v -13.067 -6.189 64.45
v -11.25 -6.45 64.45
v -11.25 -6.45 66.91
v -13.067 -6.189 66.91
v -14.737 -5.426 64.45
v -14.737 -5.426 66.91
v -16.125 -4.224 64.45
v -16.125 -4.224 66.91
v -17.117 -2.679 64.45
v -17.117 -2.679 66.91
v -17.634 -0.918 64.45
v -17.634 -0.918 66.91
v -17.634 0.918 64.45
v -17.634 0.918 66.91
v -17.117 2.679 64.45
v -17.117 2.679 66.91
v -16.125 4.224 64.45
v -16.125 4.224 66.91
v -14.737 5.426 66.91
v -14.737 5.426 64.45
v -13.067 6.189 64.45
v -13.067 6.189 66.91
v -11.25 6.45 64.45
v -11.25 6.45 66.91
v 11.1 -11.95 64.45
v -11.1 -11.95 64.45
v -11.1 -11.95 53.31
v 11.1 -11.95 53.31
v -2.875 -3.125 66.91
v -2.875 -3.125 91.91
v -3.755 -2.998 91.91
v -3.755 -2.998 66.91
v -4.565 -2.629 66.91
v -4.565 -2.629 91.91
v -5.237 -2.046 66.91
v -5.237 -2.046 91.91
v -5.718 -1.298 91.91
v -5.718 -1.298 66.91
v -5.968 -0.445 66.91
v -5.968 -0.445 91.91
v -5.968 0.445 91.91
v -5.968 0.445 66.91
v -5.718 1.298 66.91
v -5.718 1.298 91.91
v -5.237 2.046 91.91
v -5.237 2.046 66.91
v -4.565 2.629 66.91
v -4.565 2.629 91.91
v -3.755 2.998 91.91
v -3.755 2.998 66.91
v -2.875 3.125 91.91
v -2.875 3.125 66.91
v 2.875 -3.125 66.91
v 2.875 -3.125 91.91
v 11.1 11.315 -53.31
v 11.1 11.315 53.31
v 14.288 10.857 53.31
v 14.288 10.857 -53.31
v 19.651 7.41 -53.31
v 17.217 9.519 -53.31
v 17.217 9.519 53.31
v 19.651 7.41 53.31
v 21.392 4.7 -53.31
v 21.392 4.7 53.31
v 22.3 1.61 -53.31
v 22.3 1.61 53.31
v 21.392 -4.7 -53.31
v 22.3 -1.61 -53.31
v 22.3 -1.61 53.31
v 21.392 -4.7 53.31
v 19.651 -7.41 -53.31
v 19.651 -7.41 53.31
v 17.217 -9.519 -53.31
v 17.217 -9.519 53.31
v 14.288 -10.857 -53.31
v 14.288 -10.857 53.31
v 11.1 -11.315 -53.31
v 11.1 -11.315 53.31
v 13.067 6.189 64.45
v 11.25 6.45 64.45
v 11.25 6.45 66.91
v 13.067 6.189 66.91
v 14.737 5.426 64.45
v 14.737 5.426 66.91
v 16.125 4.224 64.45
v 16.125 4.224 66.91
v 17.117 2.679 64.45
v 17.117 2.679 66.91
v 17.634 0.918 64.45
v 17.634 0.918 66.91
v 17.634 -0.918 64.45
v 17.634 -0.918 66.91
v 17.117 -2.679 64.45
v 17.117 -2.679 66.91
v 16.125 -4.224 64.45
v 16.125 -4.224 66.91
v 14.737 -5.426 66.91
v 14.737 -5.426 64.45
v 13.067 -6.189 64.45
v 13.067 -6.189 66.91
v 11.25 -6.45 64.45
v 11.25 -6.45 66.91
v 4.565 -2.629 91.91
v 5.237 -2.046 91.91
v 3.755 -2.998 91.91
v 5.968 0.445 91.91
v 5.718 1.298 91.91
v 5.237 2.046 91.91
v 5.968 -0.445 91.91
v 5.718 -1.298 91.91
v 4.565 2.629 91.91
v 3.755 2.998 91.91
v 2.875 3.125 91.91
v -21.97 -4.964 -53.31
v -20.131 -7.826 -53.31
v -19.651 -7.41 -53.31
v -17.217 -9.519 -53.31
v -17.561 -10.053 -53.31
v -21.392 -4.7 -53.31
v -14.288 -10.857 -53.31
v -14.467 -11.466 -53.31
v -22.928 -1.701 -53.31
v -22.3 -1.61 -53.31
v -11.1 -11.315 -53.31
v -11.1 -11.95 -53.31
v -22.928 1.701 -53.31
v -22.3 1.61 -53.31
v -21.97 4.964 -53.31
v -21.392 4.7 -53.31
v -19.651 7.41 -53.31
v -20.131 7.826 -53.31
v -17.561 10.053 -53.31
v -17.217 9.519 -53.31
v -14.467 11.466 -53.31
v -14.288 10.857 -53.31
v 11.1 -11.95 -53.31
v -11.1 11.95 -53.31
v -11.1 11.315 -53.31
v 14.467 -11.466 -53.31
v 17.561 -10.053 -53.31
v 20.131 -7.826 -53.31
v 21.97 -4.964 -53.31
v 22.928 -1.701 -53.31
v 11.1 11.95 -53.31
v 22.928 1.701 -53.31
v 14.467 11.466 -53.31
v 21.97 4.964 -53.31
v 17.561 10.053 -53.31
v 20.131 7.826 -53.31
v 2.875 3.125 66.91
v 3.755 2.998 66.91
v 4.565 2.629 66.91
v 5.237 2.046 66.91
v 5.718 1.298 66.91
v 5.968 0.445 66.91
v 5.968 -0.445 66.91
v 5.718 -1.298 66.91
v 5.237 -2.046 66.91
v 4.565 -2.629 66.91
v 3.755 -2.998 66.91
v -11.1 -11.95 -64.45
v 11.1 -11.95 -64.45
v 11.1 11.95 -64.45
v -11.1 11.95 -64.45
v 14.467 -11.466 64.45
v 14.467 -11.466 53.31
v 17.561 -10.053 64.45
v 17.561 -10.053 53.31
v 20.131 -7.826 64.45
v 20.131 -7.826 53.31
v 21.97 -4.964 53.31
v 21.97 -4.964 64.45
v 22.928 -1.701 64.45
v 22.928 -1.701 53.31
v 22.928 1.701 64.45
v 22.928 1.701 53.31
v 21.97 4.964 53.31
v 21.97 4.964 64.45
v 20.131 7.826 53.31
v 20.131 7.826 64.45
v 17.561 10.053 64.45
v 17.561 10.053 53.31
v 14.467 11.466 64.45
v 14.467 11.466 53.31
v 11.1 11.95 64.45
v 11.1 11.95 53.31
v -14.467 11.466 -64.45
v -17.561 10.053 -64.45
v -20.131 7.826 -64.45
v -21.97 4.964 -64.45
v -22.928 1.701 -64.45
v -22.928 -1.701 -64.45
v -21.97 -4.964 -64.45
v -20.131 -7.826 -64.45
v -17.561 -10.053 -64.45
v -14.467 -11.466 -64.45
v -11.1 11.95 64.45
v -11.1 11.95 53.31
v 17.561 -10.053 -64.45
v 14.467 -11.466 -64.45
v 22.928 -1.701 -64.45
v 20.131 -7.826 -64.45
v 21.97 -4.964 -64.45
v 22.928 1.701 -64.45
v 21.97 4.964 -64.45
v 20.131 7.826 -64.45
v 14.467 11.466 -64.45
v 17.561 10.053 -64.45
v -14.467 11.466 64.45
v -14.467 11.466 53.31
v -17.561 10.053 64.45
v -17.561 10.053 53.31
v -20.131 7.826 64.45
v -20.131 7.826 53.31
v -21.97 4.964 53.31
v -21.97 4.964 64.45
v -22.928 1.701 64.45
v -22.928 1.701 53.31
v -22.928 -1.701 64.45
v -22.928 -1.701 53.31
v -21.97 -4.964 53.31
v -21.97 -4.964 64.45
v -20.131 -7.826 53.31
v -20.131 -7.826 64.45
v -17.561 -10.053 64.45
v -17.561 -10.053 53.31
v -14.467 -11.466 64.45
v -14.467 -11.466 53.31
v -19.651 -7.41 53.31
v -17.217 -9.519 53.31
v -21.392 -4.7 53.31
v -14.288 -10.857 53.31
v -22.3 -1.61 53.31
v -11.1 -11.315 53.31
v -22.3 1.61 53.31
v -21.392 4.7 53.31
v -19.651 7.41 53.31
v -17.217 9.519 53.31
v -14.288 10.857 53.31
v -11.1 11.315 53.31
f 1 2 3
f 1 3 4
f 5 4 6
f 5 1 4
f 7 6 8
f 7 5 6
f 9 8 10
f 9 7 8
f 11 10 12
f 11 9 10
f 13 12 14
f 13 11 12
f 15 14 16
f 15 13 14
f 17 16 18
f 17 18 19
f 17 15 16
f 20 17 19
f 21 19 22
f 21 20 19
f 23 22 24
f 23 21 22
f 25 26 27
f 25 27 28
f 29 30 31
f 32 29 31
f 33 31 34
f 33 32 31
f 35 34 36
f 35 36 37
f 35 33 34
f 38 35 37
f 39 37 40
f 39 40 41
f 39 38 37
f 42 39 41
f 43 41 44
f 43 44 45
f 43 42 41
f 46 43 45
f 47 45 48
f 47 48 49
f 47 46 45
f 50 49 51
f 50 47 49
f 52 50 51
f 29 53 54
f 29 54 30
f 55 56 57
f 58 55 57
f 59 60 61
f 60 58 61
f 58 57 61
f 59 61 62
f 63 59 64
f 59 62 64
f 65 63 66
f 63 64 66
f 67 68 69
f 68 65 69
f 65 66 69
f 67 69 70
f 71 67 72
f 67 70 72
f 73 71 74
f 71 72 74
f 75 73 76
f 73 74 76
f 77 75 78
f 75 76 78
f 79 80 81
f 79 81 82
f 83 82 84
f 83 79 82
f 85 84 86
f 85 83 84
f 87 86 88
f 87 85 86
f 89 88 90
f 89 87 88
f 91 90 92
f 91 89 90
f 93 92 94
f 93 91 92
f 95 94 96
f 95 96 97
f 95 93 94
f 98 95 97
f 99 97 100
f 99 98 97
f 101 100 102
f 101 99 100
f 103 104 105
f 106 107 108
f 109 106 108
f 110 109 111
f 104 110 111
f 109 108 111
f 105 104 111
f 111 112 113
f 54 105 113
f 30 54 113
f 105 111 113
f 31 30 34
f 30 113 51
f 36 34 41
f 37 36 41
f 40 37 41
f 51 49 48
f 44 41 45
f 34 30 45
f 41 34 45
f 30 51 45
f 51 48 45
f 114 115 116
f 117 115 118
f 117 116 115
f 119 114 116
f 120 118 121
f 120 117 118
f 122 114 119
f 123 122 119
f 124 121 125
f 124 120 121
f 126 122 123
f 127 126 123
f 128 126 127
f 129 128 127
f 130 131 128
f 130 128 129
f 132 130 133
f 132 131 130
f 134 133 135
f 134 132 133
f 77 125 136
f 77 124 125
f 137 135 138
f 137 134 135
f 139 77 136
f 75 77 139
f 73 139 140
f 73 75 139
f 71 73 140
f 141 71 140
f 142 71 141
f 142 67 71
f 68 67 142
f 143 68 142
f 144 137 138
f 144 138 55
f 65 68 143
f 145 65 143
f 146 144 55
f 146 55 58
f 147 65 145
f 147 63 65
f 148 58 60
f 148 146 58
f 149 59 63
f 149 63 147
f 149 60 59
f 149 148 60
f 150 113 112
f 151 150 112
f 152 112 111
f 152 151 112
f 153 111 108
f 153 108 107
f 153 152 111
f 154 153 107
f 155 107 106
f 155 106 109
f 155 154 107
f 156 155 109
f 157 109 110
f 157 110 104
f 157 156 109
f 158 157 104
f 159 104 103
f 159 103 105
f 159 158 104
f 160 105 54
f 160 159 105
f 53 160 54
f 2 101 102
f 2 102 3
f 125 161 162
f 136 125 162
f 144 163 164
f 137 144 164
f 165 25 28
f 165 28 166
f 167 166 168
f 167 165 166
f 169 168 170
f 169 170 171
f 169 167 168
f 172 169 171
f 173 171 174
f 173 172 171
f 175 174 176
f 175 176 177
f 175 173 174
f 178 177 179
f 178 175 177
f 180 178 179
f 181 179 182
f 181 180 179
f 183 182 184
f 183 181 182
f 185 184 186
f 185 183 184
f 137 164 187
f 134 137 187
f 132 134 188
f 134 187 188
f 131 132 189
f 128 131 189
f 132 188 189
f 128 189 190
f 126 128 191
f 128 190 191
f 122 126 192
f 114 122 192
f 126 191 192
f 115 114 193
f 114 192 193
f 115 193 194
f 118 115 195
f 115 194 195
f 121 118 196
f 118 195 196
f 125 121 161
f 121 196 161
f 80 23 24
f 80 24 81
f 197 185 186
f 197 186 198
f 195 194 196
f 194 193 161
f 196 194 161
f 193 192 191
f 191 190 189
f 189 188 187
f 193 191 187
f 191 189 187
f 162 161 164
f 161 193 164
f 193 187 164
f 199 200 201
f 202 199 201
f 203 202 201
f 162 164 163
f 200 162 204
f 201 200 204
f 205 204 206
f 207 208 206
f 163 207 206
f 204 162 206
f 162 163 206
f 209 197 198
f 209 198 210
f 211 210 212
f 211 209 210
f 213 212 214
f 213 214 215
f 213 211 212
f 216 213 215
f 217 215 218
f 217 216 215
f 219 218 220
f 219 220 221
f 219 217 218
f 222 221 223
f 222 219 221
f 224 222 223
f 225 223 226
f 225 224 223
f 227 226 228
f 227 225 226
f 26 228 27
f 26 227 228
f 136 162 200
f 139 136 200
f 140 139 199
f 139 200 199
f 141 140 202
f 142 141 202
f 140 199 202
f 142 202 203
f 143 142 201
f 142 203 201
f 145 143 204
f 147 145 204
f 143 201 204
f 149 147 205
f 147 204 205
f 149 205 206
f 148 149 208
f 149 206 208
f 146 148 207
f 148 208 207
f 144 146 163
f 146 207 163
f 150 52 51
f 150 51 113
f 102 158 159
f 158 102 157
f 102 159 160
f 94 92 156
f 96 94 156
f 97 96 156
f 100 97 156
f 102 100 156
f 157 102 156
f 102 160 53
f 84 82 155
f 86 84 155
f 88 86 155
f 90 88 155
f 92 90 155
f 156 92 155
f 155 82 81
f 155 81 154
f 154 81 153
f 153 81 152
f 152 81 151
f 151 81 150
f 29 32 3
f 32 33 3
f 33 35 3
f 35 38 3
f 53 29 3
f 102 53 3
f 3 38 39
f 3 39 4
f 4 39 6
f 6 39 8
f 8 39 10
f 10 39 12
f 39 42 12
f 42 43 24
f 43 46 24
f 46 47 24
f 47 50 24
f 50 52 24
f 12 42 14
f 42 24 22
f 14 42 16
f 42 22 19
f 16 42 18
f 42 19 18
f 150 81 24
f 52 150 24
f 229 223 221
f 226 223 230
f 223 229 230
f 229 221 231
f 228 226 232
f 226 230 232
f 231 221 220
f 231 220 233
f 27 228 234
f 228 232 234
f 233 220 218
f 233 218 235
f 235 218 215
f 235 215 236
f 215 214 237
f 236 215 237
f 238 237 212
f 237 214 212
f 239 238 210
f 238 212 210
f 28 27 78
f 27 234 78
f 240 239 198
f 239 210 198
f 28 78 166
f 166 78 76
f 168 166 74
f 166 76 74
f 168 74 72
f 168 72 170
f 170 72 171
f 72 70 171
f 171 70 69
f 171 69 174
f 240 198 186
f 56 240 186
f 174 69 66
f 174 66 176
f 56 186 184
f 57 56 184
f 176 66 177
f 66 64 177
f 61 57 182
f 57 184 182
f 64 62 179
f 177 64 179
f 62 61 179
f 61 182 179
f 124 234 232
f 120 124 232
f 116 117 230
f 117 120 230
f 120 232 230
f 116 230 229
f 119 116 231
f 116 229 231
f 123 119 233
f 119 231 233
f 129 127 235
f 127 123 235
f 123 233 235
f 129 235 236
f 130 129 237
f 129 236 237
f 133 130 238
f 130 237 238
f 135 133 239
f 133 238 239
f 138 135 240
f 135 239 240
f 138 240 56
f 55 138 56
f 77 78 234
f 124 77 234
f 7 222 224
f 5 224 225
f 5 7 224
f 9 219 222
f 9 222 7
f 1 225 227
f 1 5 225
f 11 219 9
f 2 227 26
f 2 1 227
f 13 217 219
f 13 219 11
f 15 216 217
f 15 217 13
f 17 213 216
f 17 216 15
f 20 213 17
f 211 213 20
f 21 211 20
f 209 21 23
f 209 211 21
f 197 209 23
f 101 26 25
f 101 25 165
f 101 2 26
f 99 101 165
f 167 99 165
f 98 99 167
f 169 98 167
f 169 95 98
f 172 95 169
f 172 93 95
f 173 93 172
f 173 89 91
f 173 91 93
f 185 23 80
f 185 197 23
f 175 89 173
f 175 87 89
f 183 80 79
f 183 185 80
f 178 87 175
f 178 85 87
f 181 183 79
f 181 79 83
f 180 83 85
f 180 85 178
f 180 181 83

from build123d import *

# Parameters (mm, degrees)
BOSS_EXTRUDE1_DEPTH = 64.45
BOSS_EXTRUDE2_DEPTH = 11.14
BOSS_EXTRUDE3_DEPTH = 2.46
BOSS_EXTRUDE4_DEPTH = 25


with BuildPart() as part:
    # Sketch1 → Boss-Extrude1 (new, symmetric)
    with BuildSketch(Plane.XY):
        with BuildLine():
            Line((-11.1, 11.315), (11.1, 11.315))
            ThreePointArc((11.1, 11.315), (22.415, 0), (11.1, -11.315))
            Line((11.1, -11.315), (-11.1, -11.315))
            ThreePointArc((-11.1, -11.315), (-22.415, 0), (-11.1, 11.315))
        make_face()
    extrude(amount=BOSS_EXTRUDE1_DEPTH, both=True)

    # Sketch2 → Boss-Extrude2 (add)
    with BuildSketch(Plane.XY.offset(64.45)):
        with BuildLine():
            Line((-11.1, -11.95), (11.1, -11.95))
            ThreePointArc((11.1, -11.95), (23.05, 0), (11.1, 11.95))
            Line((11.1, 11.95), (-11.1, 11.95))
            ThreePointArc((-11.1, 11.95), (-23.05, 0), (-11.1, -11.95))
        make_face()
    boss_extrude2 = extrude(amount=-BOSS_EXTRUDE2_DEPTH)

    # Mirror1: Boss-Extrude2 across plane
    add(boss_extrude2.mirror(Plane.XY))

    # Sketch3 → Boss-Extrude3 (add)
    with BuildSketch(Plane.XY.offset(64.45)):
        with BuildLine():
            Line((-11.25, 6.45), (11.25, 6.45))
            ThreePointArc((11.25, 6.45), (17.7, 0), (11.25, -6.45))
            Line((11.25, -6.45), (-11.25, -6.45))
            ThreePointArc((-11.25, -6.45), (-17.7, 0), (-11.25, 6.45))
        make_face()
    extrude(amount=BOSS_EXTRUDE3_DEPTH)

    # Sketch4 → Boss-Extrude4 (add)
    with BuildSketch(Plane.XY.offset(66.91)):
        with BuildLine():
            Line((-2.875, 3.125), (2.875, 3.125))
            ThreePointArc((2.875, 3.125), (6, 0), (2.875, -3.125))
            Line((2.875, -3.125), (-2.875, -3.125))
            ThreePointArc((-2.875, -3.125), (-6, 0), (-2.875, 3.125))
        make_face()
    extrude(amount=BOSS_EXTRUDE4_DEPTH)


solid = part.part
